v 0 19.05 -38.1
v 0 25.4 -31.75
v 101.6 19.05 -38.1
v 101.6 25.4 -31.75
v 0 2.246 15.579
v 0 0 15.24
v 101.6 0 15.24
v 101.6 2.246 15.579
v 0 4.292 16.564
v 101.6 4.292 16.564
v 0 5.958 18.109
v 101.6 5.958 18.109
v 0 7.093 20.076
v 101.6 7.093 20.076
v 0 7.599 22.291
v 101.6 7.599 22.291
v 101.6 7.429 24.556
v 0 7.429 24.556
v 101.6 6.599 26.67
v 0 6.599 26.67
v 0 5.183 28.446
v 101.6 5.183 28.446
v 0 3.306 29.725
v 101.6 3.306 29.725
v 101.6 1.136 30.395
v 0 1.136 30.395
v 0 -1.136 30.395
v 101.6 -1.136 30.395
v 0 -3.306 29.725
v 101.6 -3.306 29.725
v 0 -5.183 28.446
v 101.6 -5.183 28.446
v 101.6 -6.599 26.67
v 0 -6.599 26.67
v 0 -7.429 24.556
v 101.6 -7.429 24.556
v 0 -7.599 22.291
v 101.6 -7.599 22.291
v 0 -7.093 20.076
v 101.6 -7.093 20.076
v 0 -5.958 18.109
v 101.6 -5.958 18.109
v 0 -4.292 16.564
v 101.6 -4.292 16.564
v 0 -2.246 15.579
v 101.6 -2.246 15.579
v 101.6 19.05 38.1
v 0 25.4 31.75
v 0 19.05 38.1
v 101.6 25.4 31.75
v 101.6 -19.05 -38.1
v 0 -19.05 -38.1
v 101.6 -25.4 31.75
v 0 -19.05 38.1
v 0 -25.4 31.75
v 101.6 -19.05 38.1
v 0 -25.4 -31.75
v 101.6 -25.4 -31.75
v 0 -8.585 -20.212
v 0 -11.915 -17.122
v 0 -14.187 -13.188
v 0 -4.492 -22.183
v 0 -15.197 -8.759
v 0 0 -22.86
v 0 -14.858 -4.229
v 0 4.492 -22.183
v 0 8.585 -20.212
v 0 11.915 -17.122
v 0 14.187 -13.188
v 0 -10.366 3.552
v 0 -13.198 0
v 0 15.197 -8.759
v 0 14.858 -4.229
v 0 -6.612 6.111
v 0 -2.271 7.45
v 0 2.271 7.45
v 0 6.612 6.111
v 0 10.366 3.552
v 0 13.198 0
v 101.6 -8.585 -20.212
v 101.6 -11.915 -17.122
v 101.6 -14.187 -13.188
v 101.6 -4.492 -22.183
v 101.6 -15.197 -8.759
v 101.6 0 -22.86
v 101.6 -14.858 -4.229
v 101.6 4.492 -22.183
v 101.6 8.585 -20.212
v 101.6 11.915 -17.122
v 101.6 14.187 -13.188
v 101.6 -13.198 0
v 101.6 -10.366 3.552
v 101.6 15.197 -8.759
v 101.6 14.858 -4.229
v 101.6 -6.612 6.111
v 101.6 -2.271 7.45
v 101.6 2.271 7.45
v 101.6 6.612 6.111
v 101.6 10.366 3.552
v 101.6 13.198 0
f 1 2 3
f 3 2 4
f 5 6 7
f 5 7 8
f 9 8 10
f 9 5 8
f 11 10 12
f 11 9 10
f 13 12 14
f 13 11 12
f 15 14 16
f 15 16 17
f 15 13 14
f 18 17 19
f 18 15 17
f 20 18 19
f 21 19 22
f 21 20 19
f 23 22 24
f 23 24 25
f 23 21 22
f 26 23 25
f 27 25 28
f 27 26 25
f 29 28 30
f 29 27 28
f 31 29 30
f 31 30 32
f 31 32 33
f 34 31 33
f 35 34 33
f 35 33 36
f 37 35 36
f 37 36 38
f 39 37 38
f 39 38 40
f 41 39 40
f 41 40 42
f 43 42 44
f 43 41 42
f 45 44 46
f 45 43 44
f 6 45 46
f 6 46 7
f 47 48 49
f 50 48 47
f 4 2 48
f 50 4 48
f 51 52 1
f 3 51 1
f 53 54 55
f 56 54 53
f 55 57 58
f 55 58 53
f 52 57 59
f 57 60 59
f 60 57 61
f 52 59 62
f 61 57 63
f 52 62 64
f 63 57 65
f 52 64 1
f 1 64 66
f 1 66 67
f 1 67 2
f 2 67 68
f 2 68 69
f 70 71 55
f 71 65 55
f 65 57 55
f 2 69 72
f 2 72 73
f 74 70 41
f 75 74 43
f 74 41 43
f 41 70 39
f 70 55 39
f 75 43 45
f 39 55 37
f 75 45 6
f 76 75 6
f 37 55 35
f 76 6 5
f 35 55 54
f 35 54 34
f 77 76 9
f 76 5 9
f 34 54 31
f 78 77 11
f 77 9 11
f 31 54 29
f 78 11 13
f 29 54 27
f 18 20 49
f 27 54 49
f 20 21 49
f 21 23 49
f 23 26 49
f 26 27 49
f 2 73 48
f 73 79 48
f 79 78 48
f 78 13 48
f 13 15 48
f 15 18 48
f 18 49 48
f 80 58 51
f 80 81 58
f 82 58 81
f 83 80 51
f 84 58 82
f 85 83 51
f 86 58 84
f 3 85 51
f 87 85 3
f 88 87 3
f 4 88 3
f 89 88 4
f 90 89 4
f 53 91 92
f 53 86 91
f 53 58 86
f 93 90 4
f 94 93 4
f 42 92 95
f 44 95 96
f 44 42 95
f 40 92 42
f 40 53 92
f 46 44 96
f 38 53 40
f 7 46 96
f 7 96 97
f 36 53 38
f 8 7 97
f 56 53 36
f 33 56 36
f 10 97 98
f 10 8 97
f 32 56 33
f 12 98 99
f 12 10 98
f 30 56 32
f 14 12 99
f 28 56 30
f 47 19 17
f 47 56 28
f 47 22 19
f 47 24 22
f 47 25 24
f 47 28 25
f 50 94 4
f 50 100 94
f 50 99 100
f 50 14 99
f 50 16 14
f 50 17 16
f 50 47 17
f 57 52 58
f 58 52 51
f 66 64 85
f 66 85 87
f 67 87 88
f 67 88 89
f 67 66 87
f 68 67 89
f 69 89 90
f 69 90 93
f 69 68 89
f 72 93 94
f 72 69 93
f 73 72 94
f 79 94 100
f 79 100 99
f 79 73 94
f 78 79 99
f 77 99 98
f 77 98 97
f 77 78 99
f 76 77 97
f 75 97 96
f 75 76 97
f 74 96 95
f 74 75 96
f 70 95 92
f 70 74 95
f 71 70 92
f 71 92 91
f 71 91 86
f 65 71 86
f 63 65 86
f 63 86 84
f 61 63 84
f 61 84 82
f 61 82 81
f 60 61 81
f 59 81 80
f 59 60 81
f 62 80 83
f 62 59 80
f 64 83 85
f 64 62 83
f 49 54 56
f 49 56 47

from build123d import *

# Parameters (mm, degrees)
SKETCH1_W           = 50.8
SKETCH1_H           = 76.2
SKETCH1_R           = 15.24
SKETCH1_R_2         = 7.62
BOSS_EXTRUDE1_DEPTH = 101.6
CHAMFER2_SIZE       = 6.35
CHAMFER1_SIZE       = 6.35


with BuildPart() as part:
    # Sketch1 → Boss-Extrude1 (new body)
    with BuildSketch(Plane.YZ):
        Rectangle(SKETCH1_W, SKETCH1_H)
        with Locations(Location((0, -7.62, 0), (0, 0, 270))):
            Circle(SKETCH1_R, mode=Mode.SUBTRACT)
        with Locations(Location((0, 22.86, 0), (0, 0, 270))):
            Circle(SKETCH1_R_2, mode=Mode.SUBTRACT)
    extrude(amount=BOSS_EXTRUDE1_DEPTH)

    # Chamfer2
    chamfer2_edges = [part.edges().sort_by_distance(p)[0] for p in [
        (50.8, -25.4, 38.1),
        (50.8, -25.4, -38.1),
    ]]
    chamfer(chamfer2_edges, length=CHAMFER2_SIZE)

    # Chamfer1
    chamfer1_edges = [part.edges().sort_by_distance(p)[0] for p in [
        (50.8, 25.4, 38.1),
        (50.8, 25.4, -38.1),
    ]]
    chamfer(chamfer1_edges, length=CHAMFER1_SIZE)


solid = part.part
